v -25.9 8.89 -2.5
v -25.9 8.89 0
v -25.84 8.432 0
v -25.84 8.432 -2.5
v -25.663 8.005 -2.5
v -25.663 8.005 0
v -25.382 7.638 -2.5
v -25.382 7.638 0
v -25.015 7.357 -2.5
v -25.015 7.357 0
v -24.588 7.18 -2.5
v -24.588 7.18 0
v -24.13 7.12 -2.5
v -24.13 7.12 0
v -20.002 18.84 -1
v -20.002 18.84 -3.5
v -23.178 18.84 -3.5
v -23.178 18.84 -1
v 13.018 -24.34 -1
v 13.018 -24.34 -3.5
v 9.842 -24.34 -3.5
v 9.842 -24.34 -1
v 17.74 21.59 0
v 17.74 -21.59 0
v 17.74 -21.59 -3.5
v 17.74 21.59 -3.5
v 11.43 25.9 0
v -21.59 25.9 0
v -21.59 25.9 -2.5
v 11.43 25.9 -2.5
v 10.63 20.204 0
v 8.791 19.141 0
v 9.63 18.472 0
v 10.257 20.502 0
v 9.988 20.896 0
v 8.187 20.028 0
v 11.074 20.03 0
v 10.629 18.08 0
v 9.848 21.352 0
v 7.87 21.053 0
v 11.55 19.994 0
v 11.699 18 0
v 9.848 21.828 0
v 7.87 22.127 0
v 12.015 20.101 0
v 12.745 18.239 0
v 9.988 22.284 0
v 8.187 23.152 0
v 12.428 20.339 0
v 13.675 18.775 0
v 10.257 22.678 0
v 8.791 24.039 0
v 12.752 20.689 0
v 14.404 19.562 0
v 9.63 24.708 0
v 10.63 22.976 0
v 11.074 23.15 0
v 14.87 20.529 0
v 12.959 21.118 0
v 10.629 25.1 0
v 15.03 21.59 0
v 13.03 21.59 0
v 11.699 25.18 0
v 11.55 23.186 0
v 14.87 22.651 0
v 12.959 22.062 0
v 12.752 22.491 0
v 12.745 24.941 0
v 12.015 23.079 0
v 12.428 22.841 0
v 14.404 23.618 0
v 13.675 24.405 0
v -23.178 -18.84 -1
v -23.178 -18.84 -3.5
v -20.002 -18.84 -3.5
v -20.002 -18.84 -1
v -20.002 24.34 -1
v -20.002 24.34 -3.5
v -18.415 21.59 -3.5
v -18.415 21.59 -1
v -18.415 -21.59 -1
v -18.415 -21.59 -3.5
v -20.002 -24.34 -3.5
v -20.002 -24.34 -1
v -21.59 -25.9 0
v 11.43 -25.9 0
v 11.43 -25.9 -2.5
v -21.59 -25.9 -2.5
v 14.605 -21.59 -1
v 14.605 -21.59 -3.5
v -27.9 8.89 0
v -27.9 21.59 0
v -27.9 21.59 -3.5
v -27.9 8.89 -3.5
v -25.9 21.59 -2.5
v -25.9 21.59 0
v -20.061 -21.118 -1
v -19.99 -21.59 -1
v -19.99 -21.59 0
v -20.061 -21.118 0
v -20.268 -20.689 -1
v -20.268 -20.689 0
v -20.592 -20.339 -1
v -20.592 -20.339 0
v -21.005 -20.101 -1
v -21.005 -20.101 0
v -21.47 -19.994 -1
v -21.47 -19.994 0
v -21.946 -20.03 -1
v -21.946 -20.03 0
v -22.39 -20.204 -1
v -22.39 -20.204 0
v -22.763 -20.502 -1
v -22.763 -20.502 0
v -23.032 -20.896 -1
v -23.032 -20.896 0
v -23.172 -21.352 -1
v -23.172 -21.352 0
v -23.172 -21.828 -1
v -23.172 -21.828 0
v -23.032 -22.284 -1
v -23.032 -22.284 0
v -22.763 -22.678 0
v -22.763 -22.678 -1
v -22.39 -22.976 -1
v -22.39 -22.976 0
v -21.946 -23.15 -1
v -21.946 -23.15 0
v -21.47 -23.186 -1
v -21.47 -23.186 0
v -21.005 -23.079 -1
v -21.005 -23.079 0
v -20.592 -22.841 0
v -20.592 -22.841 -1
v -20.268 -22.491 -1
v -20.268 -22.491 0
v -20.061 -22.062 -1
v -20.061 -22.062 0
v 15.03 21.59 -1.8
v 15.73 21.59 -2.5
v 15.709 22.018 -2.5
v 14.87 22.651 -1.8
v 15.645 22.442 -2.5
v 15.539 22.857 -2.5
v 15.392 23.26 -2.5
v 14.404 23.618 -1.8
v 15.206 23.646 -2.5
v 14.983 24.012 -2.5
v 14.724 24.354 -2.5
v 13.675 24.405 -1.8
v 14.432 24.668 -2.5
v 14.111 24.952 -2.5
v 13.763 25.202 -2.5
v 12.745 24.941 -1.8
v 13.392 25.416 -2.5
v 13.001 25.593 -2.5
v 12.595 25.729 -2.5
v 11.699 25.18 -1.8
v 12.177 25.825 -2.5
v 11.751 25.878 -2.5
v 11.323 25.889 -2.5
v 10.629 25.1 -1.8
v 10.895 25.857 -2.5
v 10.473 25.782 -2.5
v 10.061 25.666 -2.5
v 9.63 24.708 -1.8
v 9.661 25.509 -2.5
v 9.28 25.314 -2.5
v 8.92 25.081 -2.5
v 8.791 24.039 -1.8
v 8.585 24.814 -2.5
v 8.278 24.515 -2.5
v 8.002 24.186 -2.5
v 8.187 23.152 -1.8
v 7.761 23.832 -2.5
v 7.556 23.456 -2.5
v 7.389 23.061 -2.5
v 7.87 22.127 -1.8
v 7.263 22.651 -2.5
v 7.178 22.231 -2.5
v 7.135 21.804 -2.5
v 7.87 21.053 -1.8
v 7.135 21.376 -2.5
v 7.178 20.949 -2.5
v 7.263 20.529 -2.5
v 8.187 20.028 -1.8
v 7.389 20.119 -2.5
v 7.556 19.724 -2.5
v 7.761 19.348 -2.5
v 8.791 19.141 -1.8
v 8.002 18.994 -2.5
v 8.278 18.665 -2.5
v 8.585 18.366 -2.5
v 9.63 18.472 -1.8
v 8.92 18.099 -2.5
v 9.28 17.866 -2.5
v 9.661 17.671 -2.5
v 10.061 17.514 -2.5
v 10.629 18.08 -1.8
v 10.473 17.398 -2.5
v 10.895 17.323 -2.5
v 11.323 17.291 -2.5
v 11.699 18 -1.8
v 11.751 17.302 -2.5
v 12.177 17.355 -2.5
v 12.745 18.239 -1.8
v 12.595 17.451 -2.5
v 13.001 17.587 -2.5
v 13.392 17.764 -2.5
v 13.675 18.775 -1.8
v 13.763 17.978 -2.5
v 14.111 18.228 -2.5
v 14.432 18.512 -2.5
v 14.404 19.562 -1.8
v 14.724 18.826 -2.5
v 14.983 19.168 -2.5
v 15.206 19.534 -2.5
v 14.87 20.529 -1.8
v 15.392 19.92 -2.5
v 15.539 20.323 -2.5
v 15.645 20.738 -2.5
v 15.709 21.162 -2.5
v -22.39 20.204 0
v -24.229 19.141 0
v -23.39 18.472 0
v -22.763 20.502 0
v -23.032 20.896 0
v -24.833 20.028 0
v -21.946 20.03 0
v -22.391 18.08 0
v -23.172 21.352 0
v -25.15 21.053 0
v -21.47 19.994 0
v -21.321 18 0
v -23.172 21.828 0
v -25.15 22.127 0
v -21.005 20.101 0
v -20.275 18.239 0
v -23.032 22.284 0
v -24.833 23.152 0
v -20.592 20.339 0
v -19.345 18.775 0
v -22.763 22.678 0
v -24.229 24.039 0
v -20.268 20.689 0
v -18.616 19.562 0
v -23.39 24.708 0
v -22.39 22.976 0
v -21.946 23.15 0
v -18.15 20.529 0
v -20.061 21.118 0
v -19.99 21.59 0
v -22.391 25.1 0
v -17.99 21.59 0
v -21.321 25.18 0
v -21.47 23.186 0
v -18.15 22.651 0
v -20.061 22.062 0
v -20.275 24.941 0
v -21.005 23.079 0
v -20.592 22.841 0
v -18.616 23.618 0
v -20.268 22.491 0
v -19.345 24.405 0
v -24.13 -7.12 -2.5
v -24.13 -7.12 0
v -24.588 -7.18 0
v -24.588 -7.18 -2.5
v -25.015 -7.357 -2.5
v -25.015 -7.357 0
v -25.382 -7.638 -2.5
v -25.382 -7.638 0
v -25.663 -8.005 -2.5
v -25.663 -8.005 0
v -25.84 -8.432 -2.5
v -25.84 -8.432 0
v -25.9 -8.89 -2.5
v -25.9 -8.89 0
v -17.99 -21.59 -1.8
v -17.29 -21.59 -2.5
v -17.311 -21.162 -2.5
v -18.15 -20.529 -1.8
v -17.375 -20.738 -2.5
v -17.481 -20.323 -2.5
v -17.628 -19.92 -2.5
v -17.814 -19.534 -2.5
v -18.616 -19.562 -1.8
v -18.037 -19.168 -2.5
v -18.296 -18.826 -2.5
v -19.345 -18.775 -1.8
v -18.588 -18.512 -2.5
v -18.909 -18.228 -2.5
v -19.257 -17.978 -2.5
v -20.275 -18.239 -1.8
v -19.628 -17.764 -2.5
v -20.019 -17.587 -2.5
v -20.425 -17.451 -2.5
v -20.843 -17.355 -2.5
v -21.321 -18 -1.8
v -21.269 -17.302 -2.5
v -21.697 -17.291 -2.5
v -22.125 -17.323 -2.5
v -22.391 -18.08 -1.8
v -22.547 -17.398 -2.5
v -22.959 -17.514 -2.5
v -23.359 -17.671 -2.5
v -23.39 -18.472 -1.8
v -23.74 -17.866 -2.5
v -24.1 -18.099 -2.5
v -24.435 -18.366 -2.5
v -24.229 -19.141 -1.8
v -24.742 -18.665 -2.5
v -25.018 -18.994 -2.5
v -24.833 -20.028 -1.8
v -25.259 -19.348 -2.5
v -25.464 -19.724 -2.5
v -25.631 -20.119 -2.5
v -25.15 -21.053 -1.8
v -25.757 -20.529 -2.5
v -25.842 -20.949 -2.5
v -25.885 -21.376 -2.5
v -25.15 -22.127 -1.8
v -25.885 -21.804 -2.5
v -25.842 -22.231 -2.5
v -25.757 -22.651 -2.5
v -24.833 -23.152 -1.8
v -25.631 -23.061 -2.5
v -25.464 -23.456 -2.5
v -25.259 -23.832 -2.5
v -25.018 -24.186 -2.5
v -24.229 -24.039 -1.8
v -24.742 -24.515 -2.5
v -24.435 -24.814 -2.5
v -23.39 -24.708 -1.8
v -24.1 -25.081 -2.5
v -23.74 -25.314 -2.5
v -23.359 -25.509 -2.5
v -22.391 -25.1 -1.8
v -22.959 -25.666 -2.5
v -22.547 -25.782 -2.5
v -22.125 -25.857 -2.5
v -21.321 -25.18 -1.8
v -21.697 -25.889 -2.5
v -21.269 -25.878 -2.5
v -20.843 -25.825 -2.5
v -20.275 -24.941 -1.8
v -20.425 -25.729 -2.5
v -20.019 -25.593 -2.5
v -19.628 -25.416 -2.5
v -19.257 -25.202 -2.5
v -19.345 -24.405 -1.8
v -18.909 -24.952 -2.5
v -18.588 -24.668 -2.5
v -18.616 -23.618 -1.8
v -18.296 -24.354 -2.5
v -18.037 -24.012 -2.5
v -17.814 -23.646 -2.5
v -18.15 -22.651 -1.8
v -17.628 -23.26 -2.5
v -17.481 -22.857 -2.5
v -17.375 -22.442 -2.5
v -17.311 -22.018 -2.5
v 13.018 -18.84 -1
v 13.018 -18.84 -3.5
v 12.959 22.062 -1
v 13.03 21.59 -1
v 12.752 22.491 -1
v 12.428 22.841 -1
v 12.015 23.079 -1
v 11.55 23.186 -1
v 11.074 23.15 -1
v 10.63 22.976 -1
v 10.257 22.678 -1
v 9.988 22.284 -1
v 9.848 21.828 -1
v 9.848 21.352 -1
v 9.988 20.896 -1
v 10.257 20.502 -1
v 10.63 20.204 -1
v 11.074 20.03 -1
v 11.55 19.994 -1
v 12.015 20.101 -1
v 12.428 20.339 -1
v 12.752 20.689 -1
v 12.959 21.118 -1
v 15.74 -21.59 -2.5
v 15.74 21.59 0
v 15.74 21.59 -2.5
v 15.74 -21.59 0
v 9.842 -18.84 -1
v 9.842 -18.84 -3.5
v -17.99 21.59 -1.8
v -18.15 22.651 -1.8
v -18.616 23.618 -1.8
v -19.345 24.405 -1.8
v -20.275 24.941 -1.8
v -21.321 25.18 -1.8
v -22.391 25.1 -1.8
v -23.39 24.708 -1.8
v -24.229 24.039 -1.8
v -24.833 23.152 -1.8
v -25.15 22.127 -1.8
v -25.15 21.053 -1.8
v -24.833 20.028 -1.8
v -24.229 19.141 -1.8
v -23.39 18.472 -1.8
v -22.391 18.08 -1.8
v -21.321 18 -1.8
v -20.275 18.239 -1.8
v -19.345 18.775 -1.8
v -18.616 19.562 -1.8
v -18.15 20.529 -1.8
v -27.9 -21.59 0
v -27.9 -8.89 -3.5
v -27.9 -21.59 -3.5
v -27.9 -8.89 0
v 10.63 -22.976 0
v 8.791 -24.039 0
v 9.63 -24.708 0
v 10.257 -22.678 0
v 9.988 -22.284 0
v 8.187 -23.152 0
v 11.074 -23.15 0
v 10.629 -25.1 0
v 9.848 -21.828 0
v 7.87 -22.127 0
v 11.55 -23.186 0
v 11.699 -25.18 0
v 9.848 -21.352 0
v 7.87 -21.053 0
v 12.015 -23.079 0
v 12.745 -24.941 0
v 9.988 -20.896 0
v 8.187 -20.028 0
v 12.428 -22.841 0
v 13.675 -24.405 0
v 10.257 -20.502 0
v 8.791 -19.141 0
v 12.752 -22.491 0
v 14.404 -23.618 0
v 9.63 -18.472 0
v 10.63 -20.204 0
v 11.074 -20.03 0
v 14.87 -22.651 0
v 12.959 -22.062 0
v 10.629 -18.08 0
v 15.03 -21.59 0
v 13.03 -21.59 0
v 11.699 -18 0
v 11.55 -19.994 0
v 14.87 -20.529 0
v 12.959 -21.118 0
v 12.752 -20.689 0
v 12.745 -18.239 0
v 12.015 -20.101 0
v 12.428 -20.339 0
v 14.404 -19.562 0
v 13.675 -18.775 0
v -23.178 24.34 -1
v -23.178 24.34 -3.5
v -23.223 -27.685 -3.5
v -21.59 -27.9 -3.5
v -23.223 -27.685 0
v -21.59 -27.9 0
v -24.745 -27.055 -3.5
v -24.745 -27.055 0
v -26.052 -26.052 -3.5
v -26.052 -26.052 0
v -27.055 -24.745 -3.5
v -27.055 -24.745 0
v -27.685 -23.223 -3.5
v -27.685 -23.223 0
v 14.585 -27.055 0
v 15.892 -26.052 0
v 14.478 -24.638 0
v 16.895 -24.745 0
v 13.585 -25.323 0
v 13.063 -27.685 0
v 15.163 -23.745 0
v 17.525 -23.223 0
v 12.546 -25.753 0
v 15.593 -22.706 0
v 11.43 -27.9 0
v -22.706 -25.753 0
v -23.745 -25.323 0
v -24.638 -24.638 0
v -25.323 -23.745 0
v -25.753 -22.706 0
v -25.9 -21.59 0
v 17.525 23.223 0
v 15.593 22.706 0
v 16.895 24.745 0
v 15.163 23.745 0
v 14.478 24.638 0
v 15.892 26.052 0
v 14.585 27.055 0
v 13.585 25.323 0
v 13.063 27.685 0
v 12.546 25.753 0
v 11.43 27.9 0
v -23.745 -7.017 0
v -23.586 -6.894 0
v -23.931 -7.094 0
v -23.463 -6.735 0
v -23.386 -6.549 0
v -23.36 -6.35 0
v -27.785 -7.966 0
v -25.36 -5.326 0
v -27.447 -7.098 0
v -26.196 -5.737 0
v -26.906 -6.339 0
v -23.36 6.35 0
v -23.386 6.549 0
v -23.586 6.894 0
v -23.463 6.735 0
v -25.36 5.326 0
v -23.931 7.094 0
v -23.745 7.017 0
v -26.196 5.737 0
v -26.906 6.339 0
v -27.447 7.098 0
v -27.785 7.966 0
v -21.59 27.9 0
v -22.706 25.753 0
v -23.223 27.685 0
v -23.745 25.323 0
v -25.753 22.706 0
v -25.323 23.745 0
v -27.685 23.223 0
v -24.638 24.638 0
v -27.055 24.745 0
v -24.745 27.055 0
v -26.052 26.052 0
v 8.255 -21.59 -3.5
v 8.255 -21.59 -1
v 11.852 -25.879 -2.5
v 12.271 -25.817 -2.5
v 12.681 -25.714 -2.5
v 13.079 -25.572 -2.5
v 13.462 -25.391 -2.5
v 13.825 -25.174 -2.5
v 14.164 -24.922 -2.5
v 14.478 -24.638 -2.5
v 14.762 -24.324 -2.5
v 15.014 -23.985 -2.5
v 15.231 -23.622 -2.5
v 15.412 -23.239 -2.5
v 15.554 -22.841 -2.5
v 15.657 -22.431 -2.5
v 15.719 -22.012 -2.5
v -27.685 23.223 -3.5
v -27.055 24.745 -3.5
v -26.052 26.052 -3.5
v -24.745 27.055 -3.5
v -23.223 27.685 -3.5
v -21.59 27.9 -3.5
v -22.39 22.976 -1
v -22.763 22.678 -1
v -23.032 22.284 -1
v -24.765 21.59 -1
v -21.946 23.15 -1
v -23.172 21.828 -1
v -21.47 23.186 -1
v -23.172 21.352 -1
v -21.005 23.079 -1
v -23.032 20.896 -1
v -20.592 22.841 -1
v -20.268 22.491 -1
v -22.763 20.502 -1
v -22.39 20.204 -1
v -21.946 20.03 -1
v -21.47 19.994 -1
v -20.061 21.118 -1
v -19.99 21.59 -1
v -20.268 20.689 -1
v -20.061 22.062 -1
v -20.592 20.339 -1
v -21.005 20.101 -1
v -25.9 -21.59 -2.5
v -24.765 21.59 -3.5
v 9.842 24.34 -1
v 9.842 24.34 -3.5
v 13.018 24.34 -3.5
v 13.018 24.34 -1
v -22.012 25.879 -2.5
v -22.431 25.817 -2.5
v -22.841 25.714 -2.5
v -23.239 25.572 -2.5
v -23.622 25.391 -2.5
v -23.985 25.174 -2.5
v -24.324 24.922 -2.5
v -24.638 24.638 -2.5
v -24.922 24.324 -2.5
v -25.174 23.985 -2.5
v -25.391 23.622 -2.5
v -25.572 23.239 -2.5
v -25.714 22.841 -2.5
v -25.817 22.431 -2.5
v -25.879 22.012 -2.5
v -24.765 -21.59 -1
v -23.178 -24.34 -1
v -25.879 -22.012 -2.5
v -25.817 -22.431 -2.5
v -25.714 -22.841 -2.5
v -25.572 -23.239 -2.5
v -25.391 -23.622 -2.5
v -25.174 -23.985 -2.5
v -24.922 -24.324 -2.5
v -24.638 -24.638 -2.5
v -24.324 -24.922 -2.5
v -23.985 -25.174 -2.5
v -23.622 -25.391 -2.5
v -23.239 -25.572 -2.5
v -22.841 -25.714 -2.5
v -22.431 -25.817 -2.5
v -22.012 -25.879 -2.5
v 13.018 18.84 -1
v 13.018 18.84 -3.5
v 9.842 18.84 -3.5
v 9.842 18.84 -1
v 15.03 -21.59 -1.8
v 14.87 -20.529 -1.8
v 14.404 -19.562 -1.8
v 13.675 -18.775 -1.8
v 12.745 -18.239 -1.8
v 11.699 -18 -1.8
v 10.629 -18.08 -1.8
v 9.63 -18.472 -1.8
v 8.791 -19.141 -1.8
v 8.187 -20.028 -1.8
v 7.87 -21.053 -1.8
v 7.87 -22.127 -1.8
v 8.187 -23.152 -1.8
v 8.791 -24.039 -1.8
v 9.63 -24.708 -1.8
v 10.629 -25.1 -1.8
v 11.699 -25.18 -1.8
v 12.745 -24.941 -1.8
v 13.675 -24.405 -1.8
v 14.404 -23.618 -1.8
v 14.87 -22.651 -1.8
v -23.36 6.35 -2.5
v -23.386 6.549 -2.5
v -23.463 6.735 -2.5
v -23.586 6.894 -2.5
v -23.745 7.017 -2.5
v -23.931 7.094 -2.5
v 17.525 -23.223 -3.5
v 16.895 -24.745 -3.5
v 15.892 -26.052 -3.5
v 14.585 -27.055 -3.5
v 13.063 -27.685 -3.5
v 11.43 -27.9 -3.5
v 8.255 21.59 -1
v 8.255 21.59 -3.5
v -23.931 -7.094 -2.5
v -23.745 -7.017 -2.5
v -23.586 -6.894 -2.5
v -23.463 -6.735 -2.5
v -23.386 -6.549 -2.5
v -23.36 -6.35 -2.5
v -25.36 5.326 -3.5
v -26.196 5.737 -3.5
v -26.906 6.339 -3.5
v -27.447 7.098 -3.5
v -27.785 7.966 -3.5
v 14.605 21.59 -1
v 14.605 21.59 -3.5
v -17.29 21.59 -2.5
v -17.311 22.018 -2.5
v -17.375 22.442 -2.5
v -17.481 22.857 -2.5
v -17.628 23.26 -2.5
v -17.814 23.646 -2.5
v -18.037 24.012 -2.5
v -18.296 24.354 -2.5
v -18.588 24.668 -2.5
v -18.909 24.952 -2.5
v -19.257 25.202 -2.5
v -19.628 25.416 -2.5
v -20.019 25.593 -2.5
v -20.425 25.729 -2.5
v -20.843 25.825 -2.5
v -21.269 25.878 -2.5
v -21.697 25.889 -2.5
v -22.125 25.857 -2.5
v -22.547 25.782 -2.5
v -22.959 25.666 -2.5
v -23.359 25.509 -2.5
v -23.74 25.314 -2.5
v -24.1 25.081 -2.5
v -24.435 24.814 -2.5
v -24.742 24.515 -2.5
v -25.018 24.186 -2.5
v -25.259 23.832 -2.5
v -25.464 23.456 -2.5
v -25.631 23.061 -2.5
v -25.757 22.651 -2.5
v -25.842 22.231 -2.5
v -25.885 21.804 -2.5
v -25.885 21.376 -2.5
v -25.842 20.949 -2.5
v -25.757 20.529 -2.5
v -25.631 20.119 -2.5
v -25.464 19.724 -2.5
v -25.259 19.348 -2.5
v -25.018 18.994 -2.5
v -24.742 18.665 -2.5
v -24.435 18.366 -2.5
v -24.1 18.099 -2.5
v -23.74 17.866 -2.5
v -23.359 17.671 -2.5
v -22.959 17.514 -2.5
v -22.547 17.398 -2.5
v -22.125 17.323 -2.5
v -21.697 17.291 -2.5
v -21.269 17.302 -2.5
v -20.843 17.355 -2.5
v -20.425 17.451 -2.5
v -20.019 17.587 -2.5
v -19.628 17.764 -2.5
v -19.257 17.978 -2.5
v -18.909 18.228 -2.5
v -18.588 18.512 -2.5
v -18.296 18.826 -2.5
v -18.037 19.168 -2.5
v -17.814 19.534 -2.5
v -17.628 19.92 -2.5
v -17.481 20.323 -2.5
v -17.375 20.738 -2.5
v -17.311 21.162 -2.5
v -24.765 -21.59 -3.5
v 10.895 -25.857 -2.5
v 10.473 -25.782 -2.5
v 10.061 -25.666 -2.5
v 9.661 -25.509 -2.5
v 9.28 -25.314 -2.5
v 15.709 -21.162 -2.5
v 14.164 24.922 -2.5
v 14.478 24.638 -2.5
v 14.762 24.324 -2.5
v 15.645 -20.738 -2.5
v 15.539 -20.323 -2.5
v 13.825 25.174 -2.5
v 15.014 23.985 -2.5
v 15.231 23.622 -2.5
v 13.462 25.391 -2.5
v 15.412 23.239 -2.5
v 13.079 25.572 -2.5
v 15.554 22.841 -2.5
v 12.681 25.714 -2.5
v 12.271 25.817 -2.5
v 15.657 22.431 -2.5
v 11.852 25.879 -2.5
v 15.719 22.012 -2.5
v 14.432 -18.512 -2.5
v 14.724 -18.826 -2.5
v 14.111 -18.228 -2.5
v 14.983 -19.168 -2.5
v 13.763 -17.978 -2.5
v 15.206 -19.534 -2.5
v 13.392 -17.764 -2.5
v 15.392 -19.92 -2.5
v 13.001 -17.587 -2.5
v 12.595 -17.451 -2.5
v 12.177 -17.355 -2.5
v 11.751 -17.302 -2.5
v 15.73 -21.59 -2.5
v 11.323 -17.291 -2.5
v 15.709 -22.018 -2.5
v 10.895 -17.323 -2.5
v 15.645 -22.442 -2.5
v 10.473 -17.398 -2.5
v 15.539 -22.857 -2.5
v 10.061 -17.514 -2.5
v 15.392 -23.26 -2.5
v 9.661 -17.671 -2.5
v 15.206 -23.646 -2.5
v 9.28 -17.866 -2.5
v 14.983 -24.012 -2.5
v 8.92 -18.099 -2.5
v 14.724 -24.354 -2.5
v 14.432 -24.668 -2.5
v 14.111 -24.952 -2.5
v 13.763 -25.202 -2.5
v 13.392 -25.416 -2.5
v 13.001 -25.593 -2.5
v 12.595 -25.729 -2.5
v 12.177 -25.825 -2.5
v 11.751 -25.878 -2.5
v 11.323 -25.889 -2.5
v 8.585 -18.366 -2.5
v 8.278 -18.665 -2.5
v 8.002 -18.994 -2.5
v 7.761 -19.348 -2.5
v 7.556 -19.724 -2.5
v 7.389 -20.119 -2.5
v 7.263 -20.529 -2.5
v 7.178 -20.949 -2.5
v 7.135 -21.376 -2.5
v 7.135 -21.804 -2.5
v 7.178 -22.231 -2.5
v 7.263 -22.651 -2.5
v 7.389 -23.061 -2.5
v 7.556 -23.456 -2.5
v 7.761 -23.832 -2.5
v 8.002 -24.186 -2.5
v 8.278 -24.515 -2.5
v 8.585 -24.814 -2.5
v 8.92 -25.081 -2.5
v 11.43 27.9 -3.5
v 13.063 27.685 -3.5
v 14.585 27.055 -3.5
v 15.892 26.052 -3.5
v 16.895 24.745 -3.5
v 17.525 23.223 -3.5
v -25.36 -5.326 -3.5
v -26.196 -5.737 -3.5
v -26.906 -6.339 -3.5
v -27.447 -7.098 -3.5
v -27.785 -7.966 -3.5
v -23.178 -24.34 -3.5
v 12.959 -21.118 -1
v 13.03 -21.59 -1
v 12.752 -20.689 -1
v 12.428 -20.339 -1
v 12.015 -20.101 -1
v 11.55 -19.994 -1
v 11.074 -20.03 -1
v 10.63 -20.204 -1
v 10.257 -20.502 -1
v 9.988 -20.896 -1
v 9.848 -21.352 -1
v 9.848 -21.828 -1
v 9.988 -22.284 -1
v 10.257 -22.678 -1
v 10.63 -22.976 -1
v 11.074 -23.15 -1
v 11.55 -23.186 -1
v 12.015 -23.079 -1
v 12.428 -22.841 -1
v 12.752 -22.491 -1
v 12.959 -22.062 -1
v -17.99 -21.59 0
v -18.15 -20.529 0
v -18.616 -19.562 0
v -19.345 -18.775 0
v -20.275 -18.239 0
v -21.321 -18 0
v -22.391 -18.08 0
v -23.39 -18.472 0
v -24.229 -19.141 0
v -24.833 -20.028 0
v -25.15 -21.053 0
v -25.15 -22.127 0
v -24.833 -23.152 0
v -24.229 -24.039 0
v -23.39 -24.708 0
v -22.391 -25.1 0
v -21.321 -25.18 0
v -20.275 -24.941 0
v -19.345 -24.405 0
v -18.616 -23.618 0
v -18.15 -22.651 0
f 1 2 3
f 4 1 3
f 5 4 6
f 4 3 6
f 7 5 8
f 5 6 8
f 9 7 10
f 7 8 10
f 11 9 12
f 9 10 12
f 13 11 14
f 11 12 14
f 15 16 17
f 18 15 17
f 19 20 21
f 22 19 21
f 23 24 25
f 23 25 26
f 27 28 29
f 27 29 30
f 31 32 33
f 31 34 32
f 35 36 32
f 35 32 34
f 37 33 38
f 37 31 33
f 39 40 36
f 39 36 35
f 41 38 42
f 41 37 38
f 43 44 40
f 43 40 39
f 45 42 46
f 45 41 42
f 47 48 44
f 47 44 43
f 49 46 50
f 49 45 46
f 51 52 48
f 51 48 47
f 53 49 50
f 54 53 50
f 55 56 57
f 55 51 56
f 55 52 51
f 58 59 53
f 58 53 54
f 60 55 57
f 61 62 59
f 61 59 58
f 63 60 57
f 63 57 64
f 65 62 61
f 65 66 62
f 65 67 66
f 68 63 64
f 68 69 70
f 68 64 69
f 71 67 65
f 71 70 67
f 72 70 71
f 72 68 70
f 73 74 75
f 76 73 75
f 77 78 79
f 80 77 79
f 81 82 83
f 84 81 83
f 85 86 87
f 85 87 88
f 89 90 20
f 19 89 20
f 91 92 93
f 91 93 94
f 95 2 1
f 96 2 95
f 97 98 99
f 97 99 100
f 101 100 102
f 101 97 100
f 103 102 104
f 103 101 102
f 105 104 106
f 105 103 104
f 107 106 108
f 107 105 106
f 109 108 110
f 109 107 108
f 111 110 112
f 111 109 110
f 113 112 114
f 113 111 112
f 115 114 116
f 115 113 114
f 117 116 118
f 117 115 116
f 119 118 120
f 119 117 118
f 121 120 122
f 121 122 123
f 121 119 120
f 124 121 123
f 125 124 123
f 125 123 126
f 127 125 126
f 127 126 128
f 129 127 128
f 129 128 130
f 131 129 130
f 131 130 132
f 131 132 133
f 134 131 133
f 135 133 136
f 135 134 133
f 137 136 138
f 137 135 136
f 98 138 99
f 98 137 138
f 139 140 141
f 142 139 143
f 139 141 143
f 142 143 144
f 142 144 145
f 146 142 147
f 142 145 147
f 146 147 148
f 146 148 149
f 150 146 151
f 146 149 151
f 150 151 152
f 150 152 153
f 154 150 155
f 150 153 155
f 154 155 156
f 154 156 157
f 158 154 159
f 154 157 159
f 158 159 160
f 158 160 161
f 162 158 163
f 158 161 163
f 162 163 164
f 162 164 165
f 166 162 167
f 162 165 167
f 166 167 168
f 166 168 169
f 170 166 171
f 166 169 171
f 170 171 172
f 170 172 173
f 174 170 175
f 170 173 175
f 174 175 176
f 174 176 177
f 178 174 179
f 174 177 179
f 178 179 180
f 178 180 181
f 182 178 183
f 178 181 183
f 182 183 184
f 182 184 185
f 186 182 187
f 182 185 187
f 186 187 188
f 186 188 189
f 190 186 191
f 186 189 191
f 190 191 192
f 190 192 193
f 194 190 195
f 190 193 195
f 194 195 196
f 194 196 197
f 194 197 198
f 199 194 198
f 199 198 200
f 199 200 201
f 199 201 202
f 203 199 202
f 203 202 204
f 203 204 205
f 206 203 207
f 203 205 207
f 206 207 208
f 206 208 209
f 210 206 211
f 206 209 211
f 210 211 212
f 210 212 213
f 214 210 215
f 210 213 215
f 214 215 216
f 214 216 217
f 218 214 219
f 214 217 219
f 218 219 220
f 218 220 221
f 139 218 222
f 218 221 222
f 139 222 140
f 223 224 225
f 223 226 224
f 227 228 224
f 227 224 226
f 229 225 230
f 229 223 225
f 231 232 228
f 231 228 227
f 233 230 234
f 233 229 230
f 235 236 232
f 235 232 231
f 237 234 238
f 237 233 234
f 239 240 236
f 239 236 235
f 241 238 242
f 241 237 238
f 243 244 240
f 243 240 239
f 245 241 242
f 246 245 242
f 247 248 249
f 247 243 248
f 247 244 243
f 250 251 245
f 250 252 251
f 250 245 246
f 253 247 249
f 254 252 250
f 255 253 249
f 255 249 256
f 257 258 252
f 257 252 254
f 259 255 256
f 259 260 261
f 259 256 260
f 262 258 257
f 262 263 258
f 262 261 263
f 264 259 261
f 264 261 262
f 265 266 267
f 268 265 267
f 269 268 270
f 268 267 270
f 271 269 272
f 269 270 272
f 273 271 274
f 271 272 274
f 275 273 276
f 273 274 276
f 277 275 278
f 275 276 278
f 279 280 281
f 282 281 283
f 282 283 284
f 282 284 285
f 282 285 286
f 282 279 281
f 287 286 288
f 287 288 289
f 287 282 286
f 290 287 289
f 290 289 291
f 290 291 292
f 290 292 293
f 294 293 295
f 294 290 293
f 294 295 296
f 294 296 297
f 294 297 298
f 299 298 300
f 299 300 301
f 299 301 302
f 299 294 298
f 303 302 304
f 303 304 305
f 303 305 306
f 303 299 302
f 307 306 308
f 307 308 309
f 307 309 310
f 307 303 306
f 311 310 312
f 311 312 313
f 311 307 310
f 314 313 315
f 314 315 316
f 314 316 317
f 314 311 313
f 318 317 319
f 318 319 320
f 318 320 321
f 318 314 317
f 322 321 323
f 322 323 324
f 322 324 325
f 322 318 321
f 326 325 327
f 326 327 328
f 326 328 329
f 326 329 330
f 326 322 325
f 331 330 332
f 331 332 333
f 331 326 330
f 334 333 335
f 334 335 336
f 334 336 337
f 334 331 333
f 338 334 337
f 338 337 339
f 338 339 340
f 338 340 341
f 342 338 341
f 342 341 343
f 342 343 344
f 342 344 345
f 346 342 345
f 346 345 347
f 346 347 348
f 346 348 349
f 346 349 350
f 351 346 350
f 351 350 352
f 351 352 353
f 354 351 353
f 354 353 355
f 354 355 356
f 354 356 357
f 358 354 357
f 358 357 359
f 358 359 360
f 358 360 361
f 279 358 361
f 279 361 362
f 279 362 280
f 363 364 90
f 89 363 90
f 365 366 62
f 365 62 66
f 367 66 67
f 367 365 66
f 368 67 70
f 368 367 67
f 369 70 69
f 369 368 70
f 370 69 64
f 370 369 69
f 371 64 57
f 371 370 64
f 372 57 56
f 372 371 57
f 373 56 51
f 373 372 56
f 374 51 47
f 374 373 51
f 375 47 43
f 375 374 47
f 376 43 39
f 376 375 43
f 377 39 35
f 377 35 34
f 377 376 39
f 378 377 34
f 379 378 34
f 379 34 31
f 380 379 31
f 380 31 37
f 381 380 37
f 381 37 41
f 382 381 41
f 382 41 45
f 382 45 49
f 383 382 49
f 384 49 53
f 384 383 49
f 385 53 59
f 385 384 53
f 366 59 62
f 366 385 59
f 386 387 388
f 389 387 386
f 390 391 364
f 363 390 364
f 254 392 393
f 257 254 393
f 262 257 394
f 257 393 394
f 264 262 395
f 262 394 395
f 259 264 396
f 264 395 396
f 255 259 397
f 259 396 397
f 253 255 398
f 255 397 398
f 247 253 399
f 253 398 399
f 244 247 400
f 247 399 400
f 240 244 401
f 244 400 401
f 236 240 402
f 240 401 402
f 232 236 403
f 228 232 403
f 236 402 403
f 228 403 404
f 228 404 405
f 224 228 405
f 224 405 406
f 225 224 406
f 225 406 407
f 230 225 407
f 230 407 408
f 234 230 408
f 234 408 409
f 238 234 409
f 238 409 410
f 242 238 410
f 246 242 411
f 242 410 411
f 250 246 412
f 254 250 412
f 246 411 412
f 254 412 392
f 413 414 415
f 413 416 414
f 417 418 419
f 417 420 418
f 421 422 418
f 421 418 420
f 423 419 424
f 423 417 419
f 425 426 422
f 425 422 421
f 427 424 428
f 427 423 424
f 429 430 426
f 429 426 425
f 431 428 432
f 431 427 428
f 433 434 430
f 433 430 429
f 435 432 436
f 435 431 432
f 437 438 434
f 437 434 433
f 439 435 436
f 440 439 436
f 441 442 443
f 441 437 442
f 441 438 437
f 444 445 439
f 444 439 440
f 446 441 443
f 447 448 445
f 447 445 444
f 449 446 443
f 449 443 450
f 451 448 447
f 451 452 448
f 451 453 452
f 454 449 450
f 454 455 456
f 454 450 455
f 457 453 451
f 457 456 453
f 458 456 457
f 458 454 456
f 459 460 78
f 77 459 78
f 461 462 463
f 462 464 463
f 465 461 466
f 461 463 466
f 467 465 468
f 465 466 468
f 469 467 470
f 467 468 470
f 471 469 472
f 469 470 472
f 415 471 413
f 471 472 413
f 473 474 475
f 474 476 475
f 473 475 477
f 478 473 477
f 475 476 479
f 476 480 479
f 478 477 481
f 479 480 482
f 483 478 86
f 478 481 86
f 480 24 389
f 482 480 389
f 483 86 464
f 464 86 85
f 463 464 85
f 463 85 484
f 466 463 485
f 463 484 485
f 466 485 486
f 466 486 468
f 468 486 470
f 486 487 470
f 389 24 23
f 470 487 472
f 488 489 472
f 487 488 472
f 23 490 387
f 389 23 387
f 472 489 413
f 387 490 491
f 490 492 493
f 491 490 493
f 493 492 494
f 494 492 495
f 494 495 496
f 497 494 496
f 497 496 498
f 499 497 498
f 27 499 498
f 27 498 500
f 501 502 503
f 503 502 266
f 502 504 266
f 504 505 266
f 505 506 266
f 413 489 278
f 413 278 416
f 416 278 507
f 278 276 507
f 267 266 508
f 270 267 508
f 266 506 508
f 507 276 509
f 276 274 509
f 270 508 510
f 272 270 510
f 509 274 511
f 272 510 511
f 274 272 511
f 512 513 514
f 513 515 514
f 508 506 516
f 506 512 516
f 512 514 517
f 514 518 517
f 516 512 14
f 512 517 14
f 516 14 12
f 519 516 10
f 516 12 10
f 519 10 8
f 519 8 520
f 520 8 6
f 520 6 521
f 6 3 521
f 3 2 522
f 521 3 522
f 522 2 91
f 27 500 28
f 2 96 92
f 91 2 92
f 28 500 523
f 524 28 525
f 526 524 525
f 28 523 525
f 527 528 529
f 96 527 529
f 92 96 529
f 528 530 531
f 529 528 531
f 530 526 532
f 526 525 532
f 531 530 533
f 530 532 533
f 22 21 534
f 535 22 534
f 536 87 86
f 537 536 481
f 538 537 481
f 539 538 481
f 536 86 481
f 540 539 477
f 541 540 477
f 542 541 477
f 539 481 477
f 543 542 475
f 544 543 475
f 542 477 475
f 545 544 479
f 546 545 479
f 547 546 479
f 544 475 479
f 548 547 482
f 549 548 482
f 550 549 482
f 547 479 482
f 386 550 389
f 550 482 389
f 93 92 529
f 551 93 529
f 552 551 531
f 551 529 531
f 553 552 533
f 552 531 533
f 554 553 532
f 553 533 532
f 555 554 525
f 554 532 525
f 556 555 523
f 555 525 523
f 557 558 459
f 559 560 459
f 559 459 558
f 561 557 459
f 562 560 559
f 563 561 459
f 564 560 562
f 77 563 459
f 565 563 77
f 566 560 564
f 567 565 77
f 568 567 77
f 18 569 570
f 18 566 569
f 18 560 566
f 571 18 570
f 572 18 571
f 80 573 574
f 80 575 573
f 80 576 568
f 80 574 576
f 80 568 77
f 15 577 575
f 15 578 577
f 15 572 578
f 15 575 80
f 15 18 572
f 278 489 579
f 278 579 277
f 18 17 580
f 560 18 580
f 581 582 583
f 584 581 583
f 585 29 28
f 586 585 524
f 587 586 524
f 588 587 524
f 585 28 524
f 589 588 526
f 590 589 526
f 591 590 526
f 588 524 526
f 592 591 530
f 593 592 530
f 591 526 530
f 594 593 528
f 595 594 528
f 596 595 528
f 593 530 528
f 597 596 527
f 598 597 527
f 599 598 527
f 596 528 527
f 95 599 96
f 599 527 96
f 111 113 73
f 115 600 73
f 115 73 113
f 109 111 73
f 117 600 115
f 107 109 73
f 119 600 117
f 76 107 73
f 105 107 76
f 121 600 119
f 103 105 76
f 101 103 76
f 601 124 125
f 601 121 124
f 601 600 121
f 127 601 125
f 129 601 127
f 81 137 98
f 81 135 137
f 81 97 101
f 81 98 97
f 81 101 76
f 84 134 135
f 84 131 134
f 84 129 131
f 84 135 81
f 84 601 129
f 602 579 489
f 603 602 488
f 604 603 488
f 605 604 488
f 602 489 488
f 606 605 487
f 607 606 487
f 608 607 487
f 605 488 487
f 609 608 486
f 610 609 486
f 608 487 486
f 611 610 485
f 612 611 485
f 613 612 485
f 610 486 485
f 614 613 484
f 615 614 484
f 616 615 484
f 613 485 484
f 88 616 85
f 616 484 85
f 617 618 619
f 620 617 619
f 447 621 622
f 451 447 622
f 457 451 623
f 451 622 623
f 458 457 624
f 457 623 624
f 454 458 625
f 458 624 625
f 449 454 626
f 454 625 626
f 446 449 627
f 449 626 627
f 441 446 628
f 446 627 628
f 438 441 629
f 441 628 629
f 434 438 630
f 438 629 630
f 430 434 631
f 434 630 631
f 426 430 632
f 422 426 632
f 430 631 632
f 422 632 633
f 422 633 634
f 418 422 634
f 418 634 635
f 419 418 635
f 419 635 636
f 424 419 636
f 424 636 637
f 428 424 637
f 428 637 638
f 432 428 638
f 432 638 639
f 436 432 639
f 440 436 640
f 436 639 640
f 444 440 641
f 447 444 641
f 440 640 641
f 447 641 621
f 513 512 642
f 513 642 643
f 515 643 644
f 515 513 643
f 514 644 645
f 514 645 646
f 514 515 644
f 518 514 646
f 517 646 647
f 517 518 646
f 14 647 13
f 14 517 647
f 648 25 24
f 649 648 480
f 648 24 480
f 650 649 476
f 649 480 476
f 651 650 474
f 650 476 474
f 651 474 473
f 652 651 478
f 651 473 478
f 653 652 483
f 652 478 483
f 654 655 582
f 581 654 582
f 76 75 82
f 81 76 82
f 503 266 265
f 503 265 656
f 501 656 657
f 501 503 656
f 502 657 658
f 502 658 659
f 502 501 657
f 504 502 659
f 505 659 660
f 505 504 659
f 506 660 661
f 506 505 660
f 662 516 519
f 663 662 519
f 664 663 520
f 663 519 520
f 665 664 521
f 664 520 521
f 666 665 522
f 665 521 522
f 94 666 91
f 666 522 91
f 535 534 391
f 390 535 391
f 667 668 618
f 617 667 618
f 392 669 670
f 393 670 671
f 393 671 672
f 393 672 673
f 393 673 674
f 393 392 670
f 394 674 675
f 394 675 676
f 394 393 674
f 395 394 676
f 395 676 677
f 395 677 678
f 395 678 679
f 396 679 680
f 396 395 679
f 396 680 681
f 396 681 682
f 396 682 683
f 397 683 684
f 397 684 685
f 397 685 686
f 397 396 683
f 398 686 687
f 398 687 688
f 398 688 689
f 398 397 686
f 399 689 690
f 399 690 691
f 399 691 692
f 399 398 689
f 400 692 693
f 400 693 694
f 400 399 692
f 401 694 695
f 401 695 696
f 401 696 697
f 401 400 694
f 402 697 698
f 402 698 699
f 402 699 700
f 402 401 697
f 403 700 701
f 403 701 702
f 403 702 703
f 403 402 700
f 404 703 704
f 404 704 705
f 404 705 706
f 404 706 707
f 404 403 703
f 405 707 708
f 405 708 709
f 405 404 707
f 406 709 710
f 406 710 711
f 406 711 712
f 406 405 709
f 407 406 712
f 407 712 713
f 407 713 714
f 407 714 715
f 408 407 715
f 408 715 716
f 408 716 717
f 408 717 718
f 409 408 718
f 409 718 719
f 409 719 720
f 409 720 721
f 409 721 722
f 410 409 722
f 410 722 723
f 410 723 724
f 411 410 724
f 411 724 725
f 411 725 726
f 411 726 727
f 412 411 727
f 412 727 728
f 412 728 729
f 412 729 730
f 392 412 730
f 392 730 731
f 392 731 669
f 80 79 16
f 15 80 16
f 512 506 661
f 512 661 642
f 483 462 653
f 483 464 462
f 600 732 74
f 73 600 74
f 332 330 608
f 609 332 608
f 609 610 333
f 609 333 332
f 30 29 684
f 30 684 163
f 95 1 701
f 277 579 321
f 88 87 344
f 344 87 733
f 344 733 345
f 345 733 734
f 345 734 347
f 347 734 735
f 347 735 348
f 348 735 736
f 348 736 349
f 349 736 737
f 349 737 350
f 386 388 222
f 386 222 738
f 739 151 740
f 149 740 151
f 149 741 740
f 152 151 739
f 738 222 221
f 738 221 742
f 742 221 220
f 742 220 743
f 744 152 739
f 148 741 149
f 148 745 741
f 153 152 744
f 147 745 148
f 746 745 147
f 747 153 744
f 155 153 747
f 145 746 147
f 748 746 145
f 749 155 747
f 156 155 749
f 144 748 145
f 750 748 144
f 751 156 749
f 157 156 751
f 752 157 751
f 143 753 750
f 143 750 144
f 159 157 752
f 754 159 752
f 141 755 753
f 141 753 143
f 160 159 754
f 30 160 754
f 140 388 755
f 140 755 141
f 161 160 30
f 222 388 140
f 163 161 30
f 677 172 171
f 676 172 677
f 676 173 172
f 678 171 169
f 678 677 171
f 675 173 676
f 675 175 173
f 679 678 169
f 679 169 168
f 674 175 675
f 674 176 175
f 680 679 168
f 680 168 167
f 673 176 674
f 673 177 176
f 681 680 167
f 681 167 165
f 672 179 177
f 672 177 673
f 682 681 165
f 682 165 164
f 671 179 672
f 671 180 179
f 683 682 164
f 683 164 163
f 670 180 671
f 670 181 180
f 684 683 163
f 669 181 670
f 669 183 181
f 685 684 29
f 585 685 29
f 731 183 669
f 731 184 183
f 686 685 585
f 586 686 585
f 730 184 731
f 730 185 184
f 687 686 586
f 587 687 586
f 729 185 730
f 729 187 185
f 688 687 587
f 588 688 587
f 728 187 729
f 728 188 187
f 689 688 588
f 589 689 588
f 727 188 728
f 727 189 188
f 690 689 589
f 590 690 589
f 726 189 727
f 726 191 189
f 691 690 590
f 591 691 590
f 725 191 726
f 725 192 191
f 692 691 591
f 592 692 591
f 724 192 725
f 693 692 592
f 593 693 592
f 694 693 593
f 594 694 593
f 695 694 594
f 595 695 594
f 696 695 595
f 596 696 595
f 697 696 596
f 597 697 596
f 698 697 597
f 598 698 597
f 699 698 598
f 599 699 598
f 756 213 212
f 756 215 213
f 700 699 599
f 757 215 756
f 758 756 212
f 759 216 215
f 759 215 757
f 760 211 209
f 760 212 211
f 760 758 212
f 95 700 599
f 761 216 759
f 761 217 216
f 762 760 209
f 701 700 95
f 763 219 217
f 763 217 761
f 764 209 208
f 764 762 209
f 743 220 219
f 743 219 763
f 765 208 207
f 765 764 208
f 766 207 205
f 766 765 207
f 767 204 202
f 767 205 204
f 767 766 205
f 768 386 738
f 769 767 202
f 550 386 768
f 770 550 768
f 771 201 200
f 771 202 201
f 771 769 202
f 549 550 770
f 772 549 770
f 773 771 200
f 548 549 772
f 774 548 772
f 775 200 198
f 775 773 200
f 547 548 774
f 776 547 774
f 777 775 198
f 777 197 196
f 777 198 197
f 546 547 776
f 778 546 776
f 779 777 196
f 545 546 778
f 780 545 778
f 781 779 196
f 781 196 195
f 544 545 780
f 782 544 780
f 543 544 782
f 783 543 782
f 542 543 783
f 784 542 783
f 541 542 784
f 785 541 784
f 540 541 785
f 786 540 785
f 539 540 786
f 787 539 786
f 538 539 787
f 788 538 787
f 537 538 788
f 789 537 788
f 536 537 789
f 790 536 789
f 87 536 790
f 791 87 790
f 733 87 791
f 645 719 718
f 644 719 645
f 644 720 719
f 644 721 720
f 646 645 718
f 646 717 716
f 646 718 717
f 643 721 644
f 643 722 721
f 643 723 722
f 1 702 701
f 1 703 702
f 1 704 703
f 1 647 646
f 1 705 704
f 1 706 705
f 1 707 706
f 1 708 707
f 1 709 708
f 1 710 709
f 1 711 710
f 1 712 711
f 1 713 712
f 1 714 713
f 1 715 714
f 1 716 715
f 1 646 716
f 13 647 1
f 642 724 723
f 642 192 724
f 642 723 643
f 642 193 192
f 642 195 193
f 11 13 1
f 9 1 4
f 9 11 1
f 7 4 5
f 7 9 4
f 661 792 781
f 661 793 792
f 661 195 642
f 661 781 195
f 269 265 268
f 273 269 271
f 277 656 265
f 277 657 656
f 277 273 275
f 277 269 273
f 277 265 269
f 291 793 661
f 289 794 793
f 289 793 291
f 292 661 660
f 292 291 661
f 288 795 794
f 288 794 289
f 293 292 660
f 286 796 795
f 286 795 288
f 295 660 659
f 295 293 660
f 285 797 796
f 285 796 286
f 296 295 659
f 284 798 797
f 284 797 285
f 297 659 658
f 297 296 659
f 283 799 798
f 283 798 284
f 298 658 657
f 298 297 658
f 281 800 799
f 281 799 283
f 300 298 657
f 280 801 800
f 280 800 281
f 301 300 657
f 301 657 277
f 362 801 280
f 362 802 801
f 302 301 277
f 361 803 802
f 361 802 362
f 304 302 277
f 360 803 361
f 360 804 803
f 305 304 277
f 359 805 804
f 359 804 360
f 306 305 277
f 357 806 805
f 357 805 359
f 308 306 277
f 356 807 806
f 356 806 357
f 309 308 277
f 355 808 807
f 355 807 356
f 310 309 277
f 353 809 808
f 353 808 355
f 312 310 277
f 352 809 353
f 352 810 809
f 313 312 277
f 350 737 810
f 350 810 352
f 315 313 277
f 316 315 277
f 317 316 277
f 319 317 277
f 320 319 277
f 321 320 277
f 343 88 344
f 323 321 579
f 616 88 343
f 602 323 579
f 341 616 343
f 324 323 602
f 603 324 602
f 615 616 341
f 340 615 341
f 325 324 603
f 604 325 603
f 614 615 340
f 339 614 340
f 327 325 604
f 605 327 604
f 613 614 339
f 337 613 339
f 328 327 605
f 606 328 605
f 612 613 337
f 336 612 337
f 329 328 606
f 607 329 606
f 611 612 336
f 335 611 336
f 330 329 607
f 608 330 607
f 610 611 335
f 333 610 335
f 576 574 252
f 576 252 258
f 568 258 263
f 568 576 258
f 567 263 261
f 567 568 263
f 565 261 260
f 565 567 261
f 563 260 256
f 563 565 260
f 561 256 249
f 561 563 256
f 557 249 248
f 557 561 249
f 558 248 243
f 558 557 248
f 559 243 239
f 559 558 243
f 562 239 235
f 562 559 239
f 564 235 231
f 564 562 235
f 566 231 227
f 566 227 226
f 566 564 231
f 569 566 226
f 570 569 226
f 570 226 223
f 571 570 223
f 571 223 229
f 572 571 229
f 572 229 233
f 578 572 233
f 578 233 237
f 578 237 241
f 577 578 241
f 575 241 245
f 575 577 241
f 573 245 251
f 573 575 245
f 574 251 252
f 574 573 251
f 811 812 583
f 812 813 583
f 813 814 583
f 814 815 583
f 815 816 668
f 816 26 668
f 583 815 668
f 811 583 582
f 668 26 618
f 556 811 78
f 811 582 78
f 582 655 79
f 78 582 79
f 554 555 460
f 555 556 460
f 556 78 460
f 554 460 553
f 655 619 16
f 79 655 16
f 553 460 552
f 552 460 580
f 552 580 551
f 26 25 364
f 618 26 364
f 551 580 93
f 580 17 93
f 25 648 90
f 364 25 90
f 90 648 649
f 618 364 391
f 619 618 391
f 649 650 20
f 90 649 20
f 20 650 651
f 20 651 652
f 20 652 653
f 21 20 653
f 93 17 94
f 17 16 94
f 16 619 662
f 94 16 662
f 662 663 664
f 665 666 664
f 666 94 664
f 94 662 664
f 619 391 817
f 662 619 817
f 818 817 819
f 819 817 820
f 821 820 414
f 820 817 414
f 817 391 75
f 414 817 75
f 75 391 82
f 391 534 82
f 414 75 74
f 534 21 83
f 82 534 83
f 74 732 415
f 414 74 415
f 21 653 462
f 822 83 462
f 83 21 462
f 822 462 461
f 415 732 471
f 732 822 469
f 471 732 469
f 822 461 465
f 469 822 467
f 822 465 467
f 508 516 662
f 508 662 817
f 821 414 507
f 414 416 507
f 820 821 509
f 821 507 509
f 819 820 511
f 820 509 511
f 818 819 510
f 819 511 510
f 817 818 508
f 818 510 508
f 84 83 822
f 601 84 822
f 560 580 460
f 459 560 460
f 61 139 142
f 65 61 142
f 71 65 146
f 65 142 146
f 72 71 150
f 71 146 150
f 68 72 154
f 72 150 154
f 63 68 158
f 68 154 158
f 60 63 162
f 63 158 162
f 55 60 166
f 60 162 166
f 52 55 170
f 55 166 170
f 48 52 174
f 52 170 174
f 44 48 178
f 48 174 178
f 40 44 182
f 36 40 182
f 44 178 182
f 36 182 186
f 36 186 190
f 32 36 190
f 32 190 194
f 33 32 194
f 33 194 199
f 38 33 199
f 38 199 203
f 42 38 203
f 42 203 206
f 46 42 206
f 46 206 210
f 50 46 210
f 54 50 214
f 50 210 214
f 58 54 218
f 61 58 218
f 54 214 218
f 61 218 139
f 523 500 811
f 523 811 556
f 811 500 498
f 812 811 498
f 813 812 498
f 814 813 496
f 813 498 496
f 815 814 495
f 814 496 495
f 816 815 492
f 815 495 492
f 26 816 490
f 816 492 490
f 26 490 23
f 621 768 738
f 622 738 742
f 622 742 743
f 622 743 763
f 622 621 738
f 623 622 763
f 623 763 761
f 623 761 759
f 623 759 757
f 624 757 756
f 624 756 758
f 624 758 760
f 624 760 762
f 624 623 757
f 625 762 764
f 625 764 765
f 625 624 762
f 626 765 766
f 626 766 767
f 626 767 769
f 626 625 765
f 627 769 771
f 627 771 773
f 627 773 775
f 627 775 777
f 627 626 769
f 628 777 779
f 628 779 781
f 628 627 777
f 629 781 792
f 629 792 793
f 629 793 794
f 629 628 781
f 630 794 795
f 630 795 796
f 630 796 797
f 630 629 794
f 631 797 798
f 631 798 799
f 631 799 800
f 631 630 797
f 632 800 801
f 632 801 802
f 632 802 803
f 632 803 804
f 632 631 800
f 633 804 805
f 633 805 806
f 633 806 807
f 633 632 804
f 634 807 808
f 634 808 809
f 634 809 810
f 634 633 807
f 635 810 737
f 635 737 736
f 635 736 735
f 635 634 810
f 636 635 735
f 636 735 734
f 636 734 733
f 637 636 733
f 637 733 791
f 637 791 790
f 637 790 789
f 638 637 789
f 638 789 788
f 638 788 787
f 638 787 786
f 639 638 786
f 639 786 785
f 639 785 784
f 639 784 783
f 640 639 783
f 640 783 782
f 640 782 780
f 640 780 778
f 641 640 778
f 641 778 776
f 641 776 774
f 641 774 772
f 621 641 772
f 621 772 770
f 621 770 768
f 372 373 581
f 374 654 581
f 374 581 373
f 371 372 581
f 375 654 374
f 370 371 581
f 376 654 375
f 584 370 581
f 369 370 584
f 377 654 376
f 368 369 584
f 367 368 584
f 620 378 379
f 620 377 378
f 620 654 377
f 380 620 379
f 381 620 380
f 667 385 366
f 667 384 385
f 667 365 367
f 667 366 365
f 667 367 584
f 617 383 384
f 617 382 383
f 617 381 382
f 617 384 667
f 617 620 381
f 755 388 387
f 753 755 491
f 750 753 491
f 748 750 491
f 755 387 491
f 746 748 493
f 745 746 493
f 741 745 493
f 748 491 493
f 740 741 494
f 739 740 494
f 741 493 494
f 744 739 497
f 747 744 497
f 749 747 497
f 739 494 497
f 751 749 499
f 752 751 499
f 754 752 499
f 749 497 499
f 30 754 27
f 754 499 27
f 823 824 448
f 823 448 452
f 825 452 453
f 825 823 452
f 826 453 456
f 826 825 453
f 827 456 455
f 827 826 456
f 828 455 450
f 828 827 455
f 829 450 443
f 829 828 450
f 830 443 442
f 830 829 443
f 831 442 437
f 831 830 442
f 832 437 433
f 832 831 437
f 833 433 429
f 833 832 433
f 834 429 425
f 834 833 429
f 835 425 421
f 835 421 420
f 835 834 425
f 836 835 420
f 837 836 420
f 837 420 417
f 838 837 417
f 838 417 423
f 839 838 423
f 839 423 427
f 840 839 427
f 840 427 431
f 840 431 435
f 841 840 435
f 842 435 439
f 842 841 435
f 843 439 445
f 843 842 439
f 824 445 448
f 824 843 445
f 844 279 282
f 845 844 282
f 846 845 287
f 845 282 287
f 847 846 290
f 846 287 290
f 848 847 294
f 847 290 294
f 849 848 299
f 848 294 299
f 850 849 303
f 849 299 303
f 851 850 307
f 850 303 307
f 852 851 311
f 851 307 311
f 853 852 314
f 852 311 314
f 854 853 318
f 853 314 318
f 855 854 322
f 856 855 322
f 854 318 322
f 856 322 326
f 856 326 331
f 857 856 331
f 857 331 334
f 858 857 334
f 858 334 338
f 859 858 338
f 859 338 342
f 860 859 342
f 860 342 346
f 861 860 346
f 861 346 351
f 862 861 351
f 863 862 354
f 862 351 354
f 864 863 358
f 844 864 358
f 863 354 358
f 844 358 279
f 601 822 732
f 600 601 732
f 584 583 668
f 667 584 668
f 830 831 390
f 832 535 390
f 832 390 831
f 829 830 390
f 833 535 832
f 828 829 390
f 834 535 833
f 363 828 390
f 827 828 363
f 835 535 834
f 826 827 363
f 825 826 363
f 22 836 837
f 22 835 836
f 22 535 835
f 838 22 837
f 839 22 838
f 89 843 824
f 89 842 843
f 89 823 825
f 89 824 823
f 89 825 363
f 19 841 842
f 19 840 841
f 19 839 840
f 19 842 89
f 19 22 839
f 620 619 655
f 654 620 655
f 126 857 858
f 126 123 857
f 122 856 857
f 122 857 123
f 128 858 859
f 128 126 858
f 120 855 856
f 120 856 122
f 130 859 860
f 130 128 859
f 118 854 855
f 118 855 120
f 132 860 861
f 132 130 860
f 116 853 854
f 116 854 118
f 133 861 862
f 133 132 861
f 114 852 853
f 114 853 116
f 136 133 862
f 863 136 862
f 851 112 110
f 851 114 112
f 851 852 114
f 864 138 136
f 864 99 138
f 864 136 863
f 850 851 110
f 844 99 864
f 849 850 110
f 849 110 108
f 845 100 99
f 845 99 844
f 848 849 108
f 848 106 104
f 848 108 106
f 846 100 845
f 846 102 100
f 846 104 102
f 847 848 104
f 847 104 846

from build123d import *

# Parameters (mm, degrees)
PAD_DEPTH       = 2.5
PAD001_DEPTH    = 1
SKETCH003_R     = 1.6
POCKET_DEPTH    = 3.501
SKETCH004_R     = 3.6
SKETCH004_R_2   = 1.6
PAD002_DEPTH    = 2.5
POCKET003_DEPTH = 2.5
CHAMFER005_SIZE = 0.7


with BuildPart() as part:
    # Sketch001 → Pad (new body)
    with BuildSketch(Plane.XY):
        with BuildLine():
            Line((-21.59, 27.9), (11.43, 27.9))
            ThreePointArc((17.74, 21.59), (15.891844, 26.051844), (11.43, 27.9))
            Line((17.74, 21.59), (17.74, -21.59))
            ThreePointArc((11.43, -27.9), (15.891844, -26.051844), (17.74, -21.59))
            Line((11.43, -27.9), (-21.59, -27.9))
            ThreePointArc((-27.9, -21.59), (-26.051844, -26.051844), (-21.59, -27.9))
            Line((-27.9, -21.59), (-27.9, -8.89))
            ThreePointArc((-25.36, -5.326294), (-27.200016, -6.701873), (-27.9, -8.89))
            Line((-25.36, -5.326294), (-25.36, 5.326294))
            ThreePointArc((-27.9, 8.89), (-27.200016, 6.701873), (-25.36, 5.326294))
            Line((-27.9, 8.89), (-27.9, 21.59))
            ThreePointArc((-21.59, 27.9), (-26.051844, 26.051844), (-27.9, 21.59))
        make_face()
        with BuildLine():
            Line((-21.59, 25.9), (11.43, 25.9))
            ThreePointArc((15.74, 21.59), (14.47763, 24.63763), (11.43, 25.9))
            Line((15.74, 21.59), (15.74, -21.59))
            ThreePointArc((11.43, -25.9), (14.47763, -24.63763), (15.74, -21.59))
            Line((11.43, -25.9), (-21.59, -25.9))
            ThreePointArc((-25.9, -21.59), (-24.63763, -24.63763), (-21.59, -25.9))
            Line((-25.9, -21.59), (-25.9, -8.89))
            ThreePointArc((-24.13, -7.12), (-25.381579, -7.638421), (-25.9, -8.89))
            ThreePointArc((-24.13, -7.12), (-23.585528, -6.894472), (-23.36, -6.35))
            Line((-23.36, -6.35), (-23.36, 6.35))
            ThreePointArc((-23.36, 6.35), (-23.585528, 6.894472), (-24.13, 7.12))
            ThreePointArc((-25.9, 8.89), (-25.381579, 7.638421), (-24.13, 7.12))
            Line((-25.9, 8.89), (-25.9, 21.59))
            ThreePointArc((-21.59, 25.9), (-24.63763, 24.63763), (-25.9, 21.59))
        make_face(mode=Mode.SUBTRACT)
    extrude(amount=-PAD_DEPTH)

    # Sketch002 (on Face28 of Pad) → Pad001 (join)
    with BuildSketch(Plane(origin=(0, 0, -2.5), x_dir=(1, 0, 0), z_dir=(0, 0, -1))):
        with BuildLine():
            Line((-21.59, 27.9), (11.43, 27.9))
            ThreePointArc((17.74, 21.59), (15.891844, 26.051844), (11.43, 27.9))
            Line((17.74, 21.59), (17.74, -21.59))
            ThreePointArc((11.43, -27.9), (15.891844, -26.051844), (17.74, -21.59))
            Line((11.43, -27.9), (-21.59, -27.9))
            ThreePointArc((-27.9, -21.59), (-26.051844, -26.051844), (-21.59, -27.9))
            Line((-27.9, -21.59), (-27.9, -8.89))
            ThreePointArc((-25.36, -5.326294), (-27.200016, -6.701873), (-27.9, -8.89))
            Line((-25.36, -5.326294), (-25.36, 5.326294))
            ThreePointArc((-27.9, 8.89), (-27.200016, 6.701873), (-25.36, 5.326294))
            Line((-27.9, 8.89), (-27.9, 21.59))
            ThreePointArc((-21.59, 27.9), (-26.051844, 26.051844), (-27.9, 21.59))
        make_face()
    extrude(amount=PAD001_DEPTH)

    # Sketch003 (on Face31 of Pad001) → Pocket (cut, through all)
    with BuildSketch(Plane(origin=(0, 0, -3.5), x_dir=(1, 0, 0), z_dir=(0, 0, -1))):
        with Locations((-21.59, 21.59)):
            Circle(SKETCH003_R)
        with Locations((11.43, 21.59)):
            Circle(SKETCH003_R)
        with Locations((11.43, -21.59)):
            Circle(SKETCH003_R)
        with Locations((-21.59, -21.59)):
            Circle(SKETCH003_R)
    extrude(amount=-POCKET_DEPTH, mode=Mode.SUBTRACT)

    # Sketch004 (on Face41 of Pocket) → Pad002 (join)
    with BuildSketch(Plane.XY.offset(-2.5)):
        with Locations((11.43, 21.59)):
            Circle(SKETCH004_R)
        with Locations((11.43, 21.59)):
            Circle(SKETCH004_R_2, mode=Mode.SUBTRACT)
        with Locations((-21.59, 21.59)):
            Circle(SKETCH004_R)
        with Locations((-21.59, 21.59)):
            Circle(SKETCH004_R_2, mode=Mode.SUBTRACT)
        with Locations((11.43, -21.59)):
            Circle(SKETCH004_R)
        with Locations((11.43, -21.59)):
            Circle(SKETCH004_R_2, mode=Mode.SUBTRACT)
        with Locations((-21.59, -21.59)):
            Circle(SKETCH004_R)
        with Locations((-21.59, -21.59)):
            Circle(SKETCH004_R_2, mode=Mode.SUBTRACT)
    extrude(amount=PAD002_DEPTH)

    # Sketch012 (on Face31 of Pad002) → Pocket003 (cut)
    with BuildSketch(Plane(origin=(0, 0, -3.5), x_dir=(1, 0, 0), z_dir=(0, 0, -1))):
        Polygon((-18.414574, -21.59), (-20.002287, -18.84), (-23.177713, -18.84), (-24.765426, -21.59), (-23.177713, -24.34), (-20.002287, -24.34), align=None)
        Polygon((8.254574, -21.59), (9.842287, -24.34), (13.017713, -24.34), (14.605426, -21.59), (13.017713, -18.84), (9.842287, -18.84), align=None)
        Polygon((-24.765426, 21.59), (-23.177713, 18.84), (-20.002287, 18.84), (-18.414574, 21.59), (-20.002287, 24.34), (-23.177713, 24.34), align=None)
        Polygon((14.605426, 21.59), (13.017713, 24.34), (9.842287, 24.34), (8.254574, 21.59), (9.842287, 18.84), (13.017713, 18.84), align=None)
    extrude(amount=-POCKET003_DEPTH, mode=Mode.SUBTRACT)

    # Chamfer005
    chamfer005_edges = [part.edges().sort_by_distance(p)[0] for p in [
        (-25.19, 21.59, -2.5),
        (7.83, 21.59, -2.5),
        (-25.19, -21.59, -2.5),
        (7.83, -21.59, -2.5),
    ]]
    chamfer(chamfer005_edges, length=CHAMFER005_SIZE)


solid = part.part
